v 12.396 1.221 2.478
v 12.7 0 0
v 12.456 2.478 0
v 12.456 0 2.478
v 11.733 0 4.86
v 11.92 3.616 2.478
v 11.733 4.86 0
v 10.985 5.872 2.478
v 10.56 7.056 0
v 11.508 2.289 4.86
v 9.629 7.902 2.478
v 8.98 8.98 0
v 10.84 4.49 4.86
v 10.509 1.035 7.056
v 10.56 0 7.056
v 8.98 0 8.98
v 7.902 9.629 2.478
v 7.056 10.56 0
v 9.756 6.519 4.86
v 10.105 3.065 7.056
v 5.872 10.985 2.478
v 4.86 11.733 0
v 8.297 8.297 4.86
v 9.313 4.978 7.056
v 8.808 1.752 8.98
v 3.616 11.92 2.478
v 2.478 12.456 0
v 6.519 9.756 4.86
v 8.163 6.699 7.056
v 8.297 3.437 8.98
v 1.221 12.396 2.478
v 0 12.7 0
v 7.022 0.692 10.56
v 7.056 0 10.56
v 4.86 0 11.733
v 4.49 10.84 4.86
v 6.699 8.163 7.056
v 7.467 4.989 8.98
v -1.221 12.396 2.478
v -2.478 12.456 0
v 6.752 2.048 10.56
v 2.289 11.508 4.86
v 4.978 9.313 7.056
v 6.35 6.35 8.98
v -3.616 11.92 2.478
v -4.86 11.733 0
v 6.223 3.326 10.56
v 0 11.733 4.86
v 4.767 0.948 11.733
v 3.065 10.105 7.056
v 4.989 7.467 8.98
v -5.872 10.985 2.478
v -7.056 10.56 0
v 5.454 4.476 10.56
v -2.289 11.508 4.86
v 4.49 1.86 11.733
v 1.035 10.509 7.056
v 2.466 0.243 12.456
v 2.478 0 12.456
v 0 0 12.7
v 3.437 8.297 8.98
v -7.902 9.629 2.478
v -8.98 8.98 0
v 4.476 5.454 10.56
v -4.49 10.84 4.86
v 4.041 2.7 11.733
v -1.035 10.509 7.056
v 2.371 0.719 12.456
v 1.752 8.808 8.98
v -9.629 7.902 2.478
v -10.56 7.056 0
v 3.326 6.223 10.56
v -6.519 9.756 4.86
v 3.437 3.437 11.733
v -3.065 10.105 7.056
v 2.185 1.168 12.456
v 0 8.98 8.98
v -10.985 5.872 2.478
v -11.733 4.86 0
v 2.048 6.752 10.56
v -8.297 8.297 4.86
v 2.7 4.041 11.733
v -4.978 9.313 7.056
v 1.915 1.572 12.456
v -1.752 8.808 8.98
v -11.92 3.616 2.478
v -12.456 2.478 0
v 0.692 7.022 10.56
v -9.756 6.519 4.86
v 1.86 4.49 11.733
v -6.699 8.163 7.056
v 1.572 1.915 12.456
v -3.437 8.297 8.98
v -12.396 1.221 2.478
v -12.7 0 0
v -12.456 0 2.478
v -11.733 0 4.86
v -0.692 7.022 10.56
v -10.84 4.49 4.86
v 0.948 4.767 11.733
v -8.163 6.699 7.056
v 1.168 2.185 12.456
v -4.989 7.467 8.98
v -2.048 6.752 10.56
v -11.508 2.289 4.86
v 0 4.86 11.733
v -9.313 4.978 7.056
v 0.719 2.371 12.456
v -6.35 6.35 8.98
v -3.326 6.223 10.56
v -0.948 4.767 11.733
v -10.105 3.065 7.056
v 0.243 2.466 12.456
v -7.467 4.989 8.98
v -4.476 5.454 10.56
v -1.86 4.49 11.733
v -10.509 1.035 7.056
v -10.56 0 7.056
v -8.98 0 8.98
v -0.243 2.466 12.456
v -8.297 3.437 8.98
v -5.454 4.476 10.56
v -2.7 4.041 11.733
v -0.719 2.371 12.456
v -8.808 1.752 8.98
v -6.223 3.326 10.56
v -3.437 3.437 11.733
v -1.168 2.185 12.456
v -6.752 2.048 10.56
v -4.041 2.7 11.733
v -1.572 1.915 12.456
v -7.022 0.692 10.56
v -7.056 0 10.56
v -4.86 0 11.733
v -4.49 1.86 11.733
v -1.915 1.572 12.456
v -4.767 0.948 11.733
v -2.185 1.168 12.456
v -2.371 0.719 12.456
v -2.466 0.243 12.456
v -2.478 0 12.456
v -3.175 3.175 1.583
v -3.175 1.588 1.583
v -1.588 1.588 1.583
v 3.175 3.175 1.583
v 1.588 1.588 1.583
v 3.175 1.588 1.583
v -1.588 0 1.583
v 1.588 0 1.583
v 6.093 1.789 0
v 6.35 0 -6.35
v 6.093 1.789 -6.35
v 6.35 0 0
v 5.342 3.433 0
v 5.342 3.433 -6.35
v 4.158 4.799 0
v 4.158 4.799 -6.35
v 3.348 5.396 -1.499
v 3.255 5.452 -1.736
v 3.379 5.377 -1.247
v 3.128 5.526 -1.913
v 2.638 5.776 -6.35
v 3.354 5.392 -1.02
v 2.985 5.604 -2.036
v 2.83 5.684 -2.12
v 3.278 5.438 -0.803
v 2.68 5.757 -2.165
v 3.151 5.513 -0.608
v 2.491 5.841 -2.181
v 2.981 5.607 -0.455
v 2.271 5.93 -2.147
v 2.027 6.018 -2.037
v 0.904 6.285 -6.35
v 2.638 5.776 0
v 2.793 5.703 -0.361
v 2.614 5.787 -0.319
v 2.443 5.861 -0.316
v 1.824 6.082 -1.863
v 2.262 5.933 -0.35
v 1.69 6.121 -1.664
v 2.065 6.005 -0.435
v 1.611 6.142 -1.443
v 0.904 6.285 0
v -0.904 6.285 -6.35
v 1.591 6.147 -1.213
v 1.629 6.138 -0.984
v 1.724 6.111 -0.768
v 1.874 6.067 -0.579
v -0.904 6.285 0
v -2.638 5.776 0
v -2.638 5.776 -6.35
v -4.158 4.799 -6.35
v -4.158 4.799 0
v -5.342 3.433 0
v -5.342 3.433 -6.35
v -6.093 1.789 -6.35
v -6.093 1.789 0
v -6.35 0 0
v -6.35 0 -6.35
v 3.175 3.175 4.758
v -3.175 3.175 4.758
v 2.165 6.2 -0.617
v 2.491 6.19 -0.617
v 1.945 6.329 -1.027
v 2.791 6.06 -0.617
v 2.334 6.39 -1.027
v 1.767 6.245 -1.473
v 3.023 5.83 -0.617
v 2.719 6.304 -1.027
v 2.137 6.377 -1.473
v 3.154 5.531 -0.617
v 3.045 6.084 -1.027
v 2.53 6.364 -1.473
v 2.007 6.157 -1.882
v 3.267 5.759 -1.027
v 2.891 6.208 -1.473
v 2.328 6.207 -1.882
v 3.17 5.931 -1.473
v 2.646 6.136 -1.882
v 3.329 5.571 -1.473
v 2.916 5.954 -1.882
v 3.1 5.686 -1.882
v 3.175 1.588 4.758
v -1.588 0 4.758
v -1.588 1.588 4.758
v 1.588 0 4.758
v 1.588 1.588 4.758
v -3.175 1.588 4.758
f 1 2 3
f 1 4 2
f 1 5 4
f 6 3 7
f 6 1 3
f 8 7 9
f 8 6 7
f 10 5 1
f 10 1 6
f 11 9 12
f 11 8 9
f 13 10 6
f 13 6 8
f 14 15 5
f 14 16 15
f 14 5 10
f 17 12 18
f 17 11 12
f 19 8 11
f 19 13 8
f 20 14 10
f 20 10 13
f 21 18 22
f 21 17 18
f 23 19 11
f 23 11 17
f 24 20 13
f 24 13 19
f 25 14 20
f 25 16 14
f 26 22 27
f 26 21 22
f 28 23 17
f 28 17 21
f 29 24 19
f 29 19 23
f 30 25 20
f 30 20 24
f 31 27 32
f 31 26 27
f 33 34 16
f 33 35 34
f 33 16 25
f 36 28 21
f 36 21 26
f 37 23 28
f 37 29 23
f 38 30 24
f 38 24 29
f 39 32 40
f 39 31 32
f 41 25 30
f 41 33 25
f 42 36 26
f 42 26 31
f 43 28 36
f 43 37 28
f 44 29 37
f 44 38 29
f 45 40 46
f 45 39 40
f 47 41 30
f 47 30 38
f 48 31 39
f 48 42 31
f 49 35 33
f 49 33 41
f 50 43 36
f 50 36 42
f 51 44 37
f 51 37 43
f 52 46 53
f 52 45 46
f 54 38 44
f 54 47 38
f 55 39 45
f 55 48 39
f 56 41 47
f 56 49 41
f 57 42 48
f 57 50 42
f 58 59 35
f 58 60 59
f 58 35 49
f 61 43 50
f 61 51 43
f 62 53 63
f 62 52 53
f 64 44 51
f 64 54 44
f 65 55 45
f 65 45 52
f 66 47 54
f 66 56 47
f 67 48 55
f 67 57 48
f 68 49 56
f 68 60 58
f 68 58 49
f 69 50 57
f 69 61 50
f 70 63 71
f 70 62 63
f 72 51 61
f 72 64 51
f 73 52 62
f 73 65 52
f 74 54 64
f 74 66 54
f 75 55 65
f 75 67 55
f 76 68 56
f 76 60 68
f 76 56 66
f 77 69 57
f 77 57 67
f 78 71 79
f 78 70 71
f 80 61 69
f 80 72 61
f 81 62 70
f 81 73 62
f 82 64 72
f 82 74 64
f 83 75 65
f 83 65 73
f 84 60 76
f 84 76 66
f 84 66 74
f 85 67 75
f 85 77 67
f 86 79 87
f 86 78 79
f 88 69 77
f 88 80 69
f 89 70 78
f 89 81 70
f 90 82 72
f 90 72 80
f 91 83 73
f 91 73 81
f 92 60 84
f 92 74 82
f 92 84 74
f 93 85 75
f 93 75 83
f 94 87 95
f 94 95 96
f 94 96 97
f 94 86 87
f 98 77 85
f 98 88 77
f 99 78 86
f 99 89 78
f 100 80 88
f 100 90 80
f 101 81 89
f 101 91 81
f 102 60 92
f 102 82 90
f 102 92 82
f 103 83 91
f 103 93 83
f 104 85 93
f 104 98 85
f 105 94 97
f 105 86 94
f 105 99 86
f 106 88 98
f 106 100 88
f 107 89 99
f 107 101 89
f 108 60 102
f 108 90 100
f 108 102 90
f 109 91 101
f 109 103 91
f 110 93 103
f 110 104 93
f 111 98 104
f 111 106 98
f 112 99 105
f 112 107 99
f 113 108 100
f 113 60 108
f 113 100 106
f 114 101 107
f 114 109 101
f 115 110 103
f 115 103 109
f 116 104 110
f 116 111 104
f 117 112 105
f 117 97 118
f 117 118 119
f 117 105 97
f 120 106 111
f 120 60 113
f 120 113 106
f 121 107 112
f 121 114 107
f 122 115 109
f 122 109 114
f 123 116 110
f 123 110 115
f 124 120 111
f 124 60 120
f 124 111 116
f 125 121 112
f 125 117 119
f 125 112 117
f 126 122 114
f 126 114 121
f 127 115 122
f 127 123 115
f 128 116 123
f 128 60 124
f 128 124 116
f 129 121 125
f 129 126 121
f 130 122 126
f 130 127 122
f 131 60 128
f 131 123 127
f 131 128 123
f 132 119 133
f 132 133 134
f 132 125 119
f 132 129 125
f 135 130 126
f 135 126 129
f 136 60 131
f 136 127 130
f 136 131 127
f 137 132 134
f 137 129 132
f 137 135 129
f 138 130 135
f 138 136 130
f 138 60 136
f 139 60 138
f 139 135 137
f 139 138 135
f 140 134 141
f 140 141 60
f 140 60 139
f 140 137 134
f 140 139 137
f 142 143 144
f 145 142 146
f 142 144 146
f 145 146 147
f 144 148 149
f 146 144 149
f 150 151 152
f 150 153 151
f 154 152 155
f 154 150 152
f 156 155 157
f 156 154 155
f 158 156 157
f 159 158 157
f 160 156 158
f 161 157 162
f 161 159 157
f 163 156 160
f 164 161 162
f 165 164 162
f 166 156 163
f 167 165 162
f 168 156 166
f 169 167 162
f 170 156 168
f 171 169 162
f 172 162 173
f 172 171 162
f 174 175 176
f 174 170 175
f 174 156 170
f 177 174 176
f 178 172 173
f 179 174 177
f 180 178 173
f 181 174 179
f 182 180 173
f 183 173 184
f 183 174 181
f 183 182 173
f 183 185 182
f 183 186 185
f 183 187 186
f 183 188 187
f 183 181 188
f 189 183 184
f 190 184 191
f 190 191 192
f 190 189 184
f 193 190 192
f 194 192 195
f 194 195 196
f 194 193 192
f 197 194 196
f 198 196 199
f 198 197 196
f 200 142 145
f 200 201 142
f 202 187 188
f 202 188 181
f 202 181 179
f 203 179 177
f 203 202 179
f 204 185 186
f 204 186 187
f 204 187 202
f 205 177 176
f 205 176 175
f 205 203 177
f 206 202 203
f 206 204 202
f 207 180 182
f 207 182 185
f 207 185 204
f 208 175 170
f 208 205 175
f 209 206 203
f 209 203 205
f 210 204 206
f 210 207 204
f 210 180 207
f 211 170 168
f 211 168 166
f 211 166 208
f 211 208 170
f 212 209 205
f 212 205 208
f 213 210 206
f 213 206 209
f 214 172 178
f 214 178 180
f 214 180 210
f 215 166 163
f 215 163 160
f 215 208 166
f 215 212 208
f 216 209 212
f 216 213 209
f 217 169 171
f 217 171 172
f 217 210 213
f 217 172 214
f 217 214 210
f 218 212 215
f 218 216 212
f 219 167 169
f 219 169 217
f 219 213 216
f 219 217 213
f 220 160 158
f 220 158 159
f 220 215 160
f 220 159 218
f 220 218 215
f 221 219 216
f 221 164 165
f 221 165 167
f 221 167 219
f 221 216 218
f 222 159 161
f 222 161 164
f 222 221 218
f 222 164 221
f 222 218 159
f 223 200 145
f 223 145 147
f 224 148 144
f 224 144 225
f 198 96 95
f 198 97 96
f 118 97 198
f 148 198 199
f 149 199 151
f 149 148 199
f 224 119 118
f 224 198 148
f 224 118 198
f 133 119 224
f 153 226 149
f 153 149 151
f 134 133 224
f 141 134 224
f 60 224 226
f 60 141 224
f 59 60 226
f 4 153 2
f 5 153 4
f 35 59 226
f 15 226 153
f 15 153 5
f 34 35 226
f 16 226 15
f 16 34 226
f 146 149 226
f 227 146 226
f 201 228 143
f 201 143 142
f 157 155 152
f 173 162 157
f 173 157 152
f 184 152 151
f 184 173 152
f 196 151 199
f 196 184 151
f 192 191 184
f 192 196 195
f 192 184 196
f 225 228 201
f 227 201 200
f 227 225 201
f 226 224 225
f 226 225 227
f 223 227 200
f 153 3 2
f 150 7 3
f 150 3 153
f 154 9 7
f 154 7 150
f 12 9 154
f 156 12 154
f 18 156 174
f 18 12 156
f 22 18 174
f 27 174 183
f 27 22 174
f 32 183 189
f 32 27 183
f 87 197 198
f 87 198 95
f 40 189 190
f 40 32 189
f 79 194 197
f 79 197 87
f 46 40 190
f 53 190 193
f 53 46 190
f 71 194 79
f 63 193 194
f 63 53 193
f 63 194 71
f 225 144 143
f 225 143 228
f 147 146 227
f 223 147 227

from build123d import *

# Parameters (mm, degrees)
F1_ANGLE = 180
F2_W     = 3.175
F2_H     = 3.175
F3_DEPTH = 3.175
F4_W     = 1.5875
F4_H     = 3.175
F5_DEPTH = 1.5875
F6_W     = 1.5875
F6_H     = 3.175
F7_DEPTH = 1.5875


with BuildPart() as f1:
    # F0 (on Front) → F1 (revolve)
    with BuildSketch(Plane.XZ):
        with BuildLine():
            Line((6.35, 0), (12.7, 0))
            ThreePointArc((12.7, 0), (8.9802561211, 8.9802561211), (0, 12.7))
            Line((0, 12.7), (0, 0))
            Line((0, 0), (0, -6.35))
            Line((0, -6.35), (6.35, -6.35))
            Line((6.35, -6.35), (6.35, 0))
        make_face()
    revolve(axis=Axis((0, 0, 3.175), (0, 0, 1)), revolution_arc=F1_ANGLE)

    # F2 (on face) → F3 (cut)
    with BuildSketch(Plane.XZ):
        with Locations((0, 3.1705502801)):
            Rectangle(F2_W, F2_H)
    extrude(amount=-F3_DEPTH, mode=Mode.SUBTRACT)

    # F4 (on face) → F5 (cut)
    with BuildSketch(Plane(origin=(1.5875, 0, 0), x_dir=(0, -1, 0), z_dir=(-1, 0, 0))):
        with Locations((-2.38125, 3.1705502801)):
            Rectangle(F4_W, F4_H)
    extrude(amount=-F5_DEPTH, mode=Mode.SUBTRACT)

    # F6 (on face) → F7 (cut)
    with BuildSketch(Plane.YZ.offset(-1.5875)):
        with Locations((2.38125, 3.1705502801)):
            Rectangle(F6_W, F6_H)
    extrude(amount=-F7_DEPTH, mode=Mode.SUBTRACT)

    # F10 (on offset) → F11 (revolve)
    with BuildSketch(Plane.XZ.offset(-5.334)):
        with BuildLine():
            Line((2.2999537177, -1.2474206742), (2.2999537177, -0.1679093605))
            ThreePointArc((2.2999537177, -0.1679093605), (1.2204424041, -1.2474206742), (2.2999537177, -2.3269319879))
            Line((2.2999537177, -2.3269319879), (2.2999537177, -1.2474206742))
        make_face()
    revolve(axis=Axis((2.2999537177, 5.334, -1.787176331), (0, 0, -1)))


solid = f1.part
